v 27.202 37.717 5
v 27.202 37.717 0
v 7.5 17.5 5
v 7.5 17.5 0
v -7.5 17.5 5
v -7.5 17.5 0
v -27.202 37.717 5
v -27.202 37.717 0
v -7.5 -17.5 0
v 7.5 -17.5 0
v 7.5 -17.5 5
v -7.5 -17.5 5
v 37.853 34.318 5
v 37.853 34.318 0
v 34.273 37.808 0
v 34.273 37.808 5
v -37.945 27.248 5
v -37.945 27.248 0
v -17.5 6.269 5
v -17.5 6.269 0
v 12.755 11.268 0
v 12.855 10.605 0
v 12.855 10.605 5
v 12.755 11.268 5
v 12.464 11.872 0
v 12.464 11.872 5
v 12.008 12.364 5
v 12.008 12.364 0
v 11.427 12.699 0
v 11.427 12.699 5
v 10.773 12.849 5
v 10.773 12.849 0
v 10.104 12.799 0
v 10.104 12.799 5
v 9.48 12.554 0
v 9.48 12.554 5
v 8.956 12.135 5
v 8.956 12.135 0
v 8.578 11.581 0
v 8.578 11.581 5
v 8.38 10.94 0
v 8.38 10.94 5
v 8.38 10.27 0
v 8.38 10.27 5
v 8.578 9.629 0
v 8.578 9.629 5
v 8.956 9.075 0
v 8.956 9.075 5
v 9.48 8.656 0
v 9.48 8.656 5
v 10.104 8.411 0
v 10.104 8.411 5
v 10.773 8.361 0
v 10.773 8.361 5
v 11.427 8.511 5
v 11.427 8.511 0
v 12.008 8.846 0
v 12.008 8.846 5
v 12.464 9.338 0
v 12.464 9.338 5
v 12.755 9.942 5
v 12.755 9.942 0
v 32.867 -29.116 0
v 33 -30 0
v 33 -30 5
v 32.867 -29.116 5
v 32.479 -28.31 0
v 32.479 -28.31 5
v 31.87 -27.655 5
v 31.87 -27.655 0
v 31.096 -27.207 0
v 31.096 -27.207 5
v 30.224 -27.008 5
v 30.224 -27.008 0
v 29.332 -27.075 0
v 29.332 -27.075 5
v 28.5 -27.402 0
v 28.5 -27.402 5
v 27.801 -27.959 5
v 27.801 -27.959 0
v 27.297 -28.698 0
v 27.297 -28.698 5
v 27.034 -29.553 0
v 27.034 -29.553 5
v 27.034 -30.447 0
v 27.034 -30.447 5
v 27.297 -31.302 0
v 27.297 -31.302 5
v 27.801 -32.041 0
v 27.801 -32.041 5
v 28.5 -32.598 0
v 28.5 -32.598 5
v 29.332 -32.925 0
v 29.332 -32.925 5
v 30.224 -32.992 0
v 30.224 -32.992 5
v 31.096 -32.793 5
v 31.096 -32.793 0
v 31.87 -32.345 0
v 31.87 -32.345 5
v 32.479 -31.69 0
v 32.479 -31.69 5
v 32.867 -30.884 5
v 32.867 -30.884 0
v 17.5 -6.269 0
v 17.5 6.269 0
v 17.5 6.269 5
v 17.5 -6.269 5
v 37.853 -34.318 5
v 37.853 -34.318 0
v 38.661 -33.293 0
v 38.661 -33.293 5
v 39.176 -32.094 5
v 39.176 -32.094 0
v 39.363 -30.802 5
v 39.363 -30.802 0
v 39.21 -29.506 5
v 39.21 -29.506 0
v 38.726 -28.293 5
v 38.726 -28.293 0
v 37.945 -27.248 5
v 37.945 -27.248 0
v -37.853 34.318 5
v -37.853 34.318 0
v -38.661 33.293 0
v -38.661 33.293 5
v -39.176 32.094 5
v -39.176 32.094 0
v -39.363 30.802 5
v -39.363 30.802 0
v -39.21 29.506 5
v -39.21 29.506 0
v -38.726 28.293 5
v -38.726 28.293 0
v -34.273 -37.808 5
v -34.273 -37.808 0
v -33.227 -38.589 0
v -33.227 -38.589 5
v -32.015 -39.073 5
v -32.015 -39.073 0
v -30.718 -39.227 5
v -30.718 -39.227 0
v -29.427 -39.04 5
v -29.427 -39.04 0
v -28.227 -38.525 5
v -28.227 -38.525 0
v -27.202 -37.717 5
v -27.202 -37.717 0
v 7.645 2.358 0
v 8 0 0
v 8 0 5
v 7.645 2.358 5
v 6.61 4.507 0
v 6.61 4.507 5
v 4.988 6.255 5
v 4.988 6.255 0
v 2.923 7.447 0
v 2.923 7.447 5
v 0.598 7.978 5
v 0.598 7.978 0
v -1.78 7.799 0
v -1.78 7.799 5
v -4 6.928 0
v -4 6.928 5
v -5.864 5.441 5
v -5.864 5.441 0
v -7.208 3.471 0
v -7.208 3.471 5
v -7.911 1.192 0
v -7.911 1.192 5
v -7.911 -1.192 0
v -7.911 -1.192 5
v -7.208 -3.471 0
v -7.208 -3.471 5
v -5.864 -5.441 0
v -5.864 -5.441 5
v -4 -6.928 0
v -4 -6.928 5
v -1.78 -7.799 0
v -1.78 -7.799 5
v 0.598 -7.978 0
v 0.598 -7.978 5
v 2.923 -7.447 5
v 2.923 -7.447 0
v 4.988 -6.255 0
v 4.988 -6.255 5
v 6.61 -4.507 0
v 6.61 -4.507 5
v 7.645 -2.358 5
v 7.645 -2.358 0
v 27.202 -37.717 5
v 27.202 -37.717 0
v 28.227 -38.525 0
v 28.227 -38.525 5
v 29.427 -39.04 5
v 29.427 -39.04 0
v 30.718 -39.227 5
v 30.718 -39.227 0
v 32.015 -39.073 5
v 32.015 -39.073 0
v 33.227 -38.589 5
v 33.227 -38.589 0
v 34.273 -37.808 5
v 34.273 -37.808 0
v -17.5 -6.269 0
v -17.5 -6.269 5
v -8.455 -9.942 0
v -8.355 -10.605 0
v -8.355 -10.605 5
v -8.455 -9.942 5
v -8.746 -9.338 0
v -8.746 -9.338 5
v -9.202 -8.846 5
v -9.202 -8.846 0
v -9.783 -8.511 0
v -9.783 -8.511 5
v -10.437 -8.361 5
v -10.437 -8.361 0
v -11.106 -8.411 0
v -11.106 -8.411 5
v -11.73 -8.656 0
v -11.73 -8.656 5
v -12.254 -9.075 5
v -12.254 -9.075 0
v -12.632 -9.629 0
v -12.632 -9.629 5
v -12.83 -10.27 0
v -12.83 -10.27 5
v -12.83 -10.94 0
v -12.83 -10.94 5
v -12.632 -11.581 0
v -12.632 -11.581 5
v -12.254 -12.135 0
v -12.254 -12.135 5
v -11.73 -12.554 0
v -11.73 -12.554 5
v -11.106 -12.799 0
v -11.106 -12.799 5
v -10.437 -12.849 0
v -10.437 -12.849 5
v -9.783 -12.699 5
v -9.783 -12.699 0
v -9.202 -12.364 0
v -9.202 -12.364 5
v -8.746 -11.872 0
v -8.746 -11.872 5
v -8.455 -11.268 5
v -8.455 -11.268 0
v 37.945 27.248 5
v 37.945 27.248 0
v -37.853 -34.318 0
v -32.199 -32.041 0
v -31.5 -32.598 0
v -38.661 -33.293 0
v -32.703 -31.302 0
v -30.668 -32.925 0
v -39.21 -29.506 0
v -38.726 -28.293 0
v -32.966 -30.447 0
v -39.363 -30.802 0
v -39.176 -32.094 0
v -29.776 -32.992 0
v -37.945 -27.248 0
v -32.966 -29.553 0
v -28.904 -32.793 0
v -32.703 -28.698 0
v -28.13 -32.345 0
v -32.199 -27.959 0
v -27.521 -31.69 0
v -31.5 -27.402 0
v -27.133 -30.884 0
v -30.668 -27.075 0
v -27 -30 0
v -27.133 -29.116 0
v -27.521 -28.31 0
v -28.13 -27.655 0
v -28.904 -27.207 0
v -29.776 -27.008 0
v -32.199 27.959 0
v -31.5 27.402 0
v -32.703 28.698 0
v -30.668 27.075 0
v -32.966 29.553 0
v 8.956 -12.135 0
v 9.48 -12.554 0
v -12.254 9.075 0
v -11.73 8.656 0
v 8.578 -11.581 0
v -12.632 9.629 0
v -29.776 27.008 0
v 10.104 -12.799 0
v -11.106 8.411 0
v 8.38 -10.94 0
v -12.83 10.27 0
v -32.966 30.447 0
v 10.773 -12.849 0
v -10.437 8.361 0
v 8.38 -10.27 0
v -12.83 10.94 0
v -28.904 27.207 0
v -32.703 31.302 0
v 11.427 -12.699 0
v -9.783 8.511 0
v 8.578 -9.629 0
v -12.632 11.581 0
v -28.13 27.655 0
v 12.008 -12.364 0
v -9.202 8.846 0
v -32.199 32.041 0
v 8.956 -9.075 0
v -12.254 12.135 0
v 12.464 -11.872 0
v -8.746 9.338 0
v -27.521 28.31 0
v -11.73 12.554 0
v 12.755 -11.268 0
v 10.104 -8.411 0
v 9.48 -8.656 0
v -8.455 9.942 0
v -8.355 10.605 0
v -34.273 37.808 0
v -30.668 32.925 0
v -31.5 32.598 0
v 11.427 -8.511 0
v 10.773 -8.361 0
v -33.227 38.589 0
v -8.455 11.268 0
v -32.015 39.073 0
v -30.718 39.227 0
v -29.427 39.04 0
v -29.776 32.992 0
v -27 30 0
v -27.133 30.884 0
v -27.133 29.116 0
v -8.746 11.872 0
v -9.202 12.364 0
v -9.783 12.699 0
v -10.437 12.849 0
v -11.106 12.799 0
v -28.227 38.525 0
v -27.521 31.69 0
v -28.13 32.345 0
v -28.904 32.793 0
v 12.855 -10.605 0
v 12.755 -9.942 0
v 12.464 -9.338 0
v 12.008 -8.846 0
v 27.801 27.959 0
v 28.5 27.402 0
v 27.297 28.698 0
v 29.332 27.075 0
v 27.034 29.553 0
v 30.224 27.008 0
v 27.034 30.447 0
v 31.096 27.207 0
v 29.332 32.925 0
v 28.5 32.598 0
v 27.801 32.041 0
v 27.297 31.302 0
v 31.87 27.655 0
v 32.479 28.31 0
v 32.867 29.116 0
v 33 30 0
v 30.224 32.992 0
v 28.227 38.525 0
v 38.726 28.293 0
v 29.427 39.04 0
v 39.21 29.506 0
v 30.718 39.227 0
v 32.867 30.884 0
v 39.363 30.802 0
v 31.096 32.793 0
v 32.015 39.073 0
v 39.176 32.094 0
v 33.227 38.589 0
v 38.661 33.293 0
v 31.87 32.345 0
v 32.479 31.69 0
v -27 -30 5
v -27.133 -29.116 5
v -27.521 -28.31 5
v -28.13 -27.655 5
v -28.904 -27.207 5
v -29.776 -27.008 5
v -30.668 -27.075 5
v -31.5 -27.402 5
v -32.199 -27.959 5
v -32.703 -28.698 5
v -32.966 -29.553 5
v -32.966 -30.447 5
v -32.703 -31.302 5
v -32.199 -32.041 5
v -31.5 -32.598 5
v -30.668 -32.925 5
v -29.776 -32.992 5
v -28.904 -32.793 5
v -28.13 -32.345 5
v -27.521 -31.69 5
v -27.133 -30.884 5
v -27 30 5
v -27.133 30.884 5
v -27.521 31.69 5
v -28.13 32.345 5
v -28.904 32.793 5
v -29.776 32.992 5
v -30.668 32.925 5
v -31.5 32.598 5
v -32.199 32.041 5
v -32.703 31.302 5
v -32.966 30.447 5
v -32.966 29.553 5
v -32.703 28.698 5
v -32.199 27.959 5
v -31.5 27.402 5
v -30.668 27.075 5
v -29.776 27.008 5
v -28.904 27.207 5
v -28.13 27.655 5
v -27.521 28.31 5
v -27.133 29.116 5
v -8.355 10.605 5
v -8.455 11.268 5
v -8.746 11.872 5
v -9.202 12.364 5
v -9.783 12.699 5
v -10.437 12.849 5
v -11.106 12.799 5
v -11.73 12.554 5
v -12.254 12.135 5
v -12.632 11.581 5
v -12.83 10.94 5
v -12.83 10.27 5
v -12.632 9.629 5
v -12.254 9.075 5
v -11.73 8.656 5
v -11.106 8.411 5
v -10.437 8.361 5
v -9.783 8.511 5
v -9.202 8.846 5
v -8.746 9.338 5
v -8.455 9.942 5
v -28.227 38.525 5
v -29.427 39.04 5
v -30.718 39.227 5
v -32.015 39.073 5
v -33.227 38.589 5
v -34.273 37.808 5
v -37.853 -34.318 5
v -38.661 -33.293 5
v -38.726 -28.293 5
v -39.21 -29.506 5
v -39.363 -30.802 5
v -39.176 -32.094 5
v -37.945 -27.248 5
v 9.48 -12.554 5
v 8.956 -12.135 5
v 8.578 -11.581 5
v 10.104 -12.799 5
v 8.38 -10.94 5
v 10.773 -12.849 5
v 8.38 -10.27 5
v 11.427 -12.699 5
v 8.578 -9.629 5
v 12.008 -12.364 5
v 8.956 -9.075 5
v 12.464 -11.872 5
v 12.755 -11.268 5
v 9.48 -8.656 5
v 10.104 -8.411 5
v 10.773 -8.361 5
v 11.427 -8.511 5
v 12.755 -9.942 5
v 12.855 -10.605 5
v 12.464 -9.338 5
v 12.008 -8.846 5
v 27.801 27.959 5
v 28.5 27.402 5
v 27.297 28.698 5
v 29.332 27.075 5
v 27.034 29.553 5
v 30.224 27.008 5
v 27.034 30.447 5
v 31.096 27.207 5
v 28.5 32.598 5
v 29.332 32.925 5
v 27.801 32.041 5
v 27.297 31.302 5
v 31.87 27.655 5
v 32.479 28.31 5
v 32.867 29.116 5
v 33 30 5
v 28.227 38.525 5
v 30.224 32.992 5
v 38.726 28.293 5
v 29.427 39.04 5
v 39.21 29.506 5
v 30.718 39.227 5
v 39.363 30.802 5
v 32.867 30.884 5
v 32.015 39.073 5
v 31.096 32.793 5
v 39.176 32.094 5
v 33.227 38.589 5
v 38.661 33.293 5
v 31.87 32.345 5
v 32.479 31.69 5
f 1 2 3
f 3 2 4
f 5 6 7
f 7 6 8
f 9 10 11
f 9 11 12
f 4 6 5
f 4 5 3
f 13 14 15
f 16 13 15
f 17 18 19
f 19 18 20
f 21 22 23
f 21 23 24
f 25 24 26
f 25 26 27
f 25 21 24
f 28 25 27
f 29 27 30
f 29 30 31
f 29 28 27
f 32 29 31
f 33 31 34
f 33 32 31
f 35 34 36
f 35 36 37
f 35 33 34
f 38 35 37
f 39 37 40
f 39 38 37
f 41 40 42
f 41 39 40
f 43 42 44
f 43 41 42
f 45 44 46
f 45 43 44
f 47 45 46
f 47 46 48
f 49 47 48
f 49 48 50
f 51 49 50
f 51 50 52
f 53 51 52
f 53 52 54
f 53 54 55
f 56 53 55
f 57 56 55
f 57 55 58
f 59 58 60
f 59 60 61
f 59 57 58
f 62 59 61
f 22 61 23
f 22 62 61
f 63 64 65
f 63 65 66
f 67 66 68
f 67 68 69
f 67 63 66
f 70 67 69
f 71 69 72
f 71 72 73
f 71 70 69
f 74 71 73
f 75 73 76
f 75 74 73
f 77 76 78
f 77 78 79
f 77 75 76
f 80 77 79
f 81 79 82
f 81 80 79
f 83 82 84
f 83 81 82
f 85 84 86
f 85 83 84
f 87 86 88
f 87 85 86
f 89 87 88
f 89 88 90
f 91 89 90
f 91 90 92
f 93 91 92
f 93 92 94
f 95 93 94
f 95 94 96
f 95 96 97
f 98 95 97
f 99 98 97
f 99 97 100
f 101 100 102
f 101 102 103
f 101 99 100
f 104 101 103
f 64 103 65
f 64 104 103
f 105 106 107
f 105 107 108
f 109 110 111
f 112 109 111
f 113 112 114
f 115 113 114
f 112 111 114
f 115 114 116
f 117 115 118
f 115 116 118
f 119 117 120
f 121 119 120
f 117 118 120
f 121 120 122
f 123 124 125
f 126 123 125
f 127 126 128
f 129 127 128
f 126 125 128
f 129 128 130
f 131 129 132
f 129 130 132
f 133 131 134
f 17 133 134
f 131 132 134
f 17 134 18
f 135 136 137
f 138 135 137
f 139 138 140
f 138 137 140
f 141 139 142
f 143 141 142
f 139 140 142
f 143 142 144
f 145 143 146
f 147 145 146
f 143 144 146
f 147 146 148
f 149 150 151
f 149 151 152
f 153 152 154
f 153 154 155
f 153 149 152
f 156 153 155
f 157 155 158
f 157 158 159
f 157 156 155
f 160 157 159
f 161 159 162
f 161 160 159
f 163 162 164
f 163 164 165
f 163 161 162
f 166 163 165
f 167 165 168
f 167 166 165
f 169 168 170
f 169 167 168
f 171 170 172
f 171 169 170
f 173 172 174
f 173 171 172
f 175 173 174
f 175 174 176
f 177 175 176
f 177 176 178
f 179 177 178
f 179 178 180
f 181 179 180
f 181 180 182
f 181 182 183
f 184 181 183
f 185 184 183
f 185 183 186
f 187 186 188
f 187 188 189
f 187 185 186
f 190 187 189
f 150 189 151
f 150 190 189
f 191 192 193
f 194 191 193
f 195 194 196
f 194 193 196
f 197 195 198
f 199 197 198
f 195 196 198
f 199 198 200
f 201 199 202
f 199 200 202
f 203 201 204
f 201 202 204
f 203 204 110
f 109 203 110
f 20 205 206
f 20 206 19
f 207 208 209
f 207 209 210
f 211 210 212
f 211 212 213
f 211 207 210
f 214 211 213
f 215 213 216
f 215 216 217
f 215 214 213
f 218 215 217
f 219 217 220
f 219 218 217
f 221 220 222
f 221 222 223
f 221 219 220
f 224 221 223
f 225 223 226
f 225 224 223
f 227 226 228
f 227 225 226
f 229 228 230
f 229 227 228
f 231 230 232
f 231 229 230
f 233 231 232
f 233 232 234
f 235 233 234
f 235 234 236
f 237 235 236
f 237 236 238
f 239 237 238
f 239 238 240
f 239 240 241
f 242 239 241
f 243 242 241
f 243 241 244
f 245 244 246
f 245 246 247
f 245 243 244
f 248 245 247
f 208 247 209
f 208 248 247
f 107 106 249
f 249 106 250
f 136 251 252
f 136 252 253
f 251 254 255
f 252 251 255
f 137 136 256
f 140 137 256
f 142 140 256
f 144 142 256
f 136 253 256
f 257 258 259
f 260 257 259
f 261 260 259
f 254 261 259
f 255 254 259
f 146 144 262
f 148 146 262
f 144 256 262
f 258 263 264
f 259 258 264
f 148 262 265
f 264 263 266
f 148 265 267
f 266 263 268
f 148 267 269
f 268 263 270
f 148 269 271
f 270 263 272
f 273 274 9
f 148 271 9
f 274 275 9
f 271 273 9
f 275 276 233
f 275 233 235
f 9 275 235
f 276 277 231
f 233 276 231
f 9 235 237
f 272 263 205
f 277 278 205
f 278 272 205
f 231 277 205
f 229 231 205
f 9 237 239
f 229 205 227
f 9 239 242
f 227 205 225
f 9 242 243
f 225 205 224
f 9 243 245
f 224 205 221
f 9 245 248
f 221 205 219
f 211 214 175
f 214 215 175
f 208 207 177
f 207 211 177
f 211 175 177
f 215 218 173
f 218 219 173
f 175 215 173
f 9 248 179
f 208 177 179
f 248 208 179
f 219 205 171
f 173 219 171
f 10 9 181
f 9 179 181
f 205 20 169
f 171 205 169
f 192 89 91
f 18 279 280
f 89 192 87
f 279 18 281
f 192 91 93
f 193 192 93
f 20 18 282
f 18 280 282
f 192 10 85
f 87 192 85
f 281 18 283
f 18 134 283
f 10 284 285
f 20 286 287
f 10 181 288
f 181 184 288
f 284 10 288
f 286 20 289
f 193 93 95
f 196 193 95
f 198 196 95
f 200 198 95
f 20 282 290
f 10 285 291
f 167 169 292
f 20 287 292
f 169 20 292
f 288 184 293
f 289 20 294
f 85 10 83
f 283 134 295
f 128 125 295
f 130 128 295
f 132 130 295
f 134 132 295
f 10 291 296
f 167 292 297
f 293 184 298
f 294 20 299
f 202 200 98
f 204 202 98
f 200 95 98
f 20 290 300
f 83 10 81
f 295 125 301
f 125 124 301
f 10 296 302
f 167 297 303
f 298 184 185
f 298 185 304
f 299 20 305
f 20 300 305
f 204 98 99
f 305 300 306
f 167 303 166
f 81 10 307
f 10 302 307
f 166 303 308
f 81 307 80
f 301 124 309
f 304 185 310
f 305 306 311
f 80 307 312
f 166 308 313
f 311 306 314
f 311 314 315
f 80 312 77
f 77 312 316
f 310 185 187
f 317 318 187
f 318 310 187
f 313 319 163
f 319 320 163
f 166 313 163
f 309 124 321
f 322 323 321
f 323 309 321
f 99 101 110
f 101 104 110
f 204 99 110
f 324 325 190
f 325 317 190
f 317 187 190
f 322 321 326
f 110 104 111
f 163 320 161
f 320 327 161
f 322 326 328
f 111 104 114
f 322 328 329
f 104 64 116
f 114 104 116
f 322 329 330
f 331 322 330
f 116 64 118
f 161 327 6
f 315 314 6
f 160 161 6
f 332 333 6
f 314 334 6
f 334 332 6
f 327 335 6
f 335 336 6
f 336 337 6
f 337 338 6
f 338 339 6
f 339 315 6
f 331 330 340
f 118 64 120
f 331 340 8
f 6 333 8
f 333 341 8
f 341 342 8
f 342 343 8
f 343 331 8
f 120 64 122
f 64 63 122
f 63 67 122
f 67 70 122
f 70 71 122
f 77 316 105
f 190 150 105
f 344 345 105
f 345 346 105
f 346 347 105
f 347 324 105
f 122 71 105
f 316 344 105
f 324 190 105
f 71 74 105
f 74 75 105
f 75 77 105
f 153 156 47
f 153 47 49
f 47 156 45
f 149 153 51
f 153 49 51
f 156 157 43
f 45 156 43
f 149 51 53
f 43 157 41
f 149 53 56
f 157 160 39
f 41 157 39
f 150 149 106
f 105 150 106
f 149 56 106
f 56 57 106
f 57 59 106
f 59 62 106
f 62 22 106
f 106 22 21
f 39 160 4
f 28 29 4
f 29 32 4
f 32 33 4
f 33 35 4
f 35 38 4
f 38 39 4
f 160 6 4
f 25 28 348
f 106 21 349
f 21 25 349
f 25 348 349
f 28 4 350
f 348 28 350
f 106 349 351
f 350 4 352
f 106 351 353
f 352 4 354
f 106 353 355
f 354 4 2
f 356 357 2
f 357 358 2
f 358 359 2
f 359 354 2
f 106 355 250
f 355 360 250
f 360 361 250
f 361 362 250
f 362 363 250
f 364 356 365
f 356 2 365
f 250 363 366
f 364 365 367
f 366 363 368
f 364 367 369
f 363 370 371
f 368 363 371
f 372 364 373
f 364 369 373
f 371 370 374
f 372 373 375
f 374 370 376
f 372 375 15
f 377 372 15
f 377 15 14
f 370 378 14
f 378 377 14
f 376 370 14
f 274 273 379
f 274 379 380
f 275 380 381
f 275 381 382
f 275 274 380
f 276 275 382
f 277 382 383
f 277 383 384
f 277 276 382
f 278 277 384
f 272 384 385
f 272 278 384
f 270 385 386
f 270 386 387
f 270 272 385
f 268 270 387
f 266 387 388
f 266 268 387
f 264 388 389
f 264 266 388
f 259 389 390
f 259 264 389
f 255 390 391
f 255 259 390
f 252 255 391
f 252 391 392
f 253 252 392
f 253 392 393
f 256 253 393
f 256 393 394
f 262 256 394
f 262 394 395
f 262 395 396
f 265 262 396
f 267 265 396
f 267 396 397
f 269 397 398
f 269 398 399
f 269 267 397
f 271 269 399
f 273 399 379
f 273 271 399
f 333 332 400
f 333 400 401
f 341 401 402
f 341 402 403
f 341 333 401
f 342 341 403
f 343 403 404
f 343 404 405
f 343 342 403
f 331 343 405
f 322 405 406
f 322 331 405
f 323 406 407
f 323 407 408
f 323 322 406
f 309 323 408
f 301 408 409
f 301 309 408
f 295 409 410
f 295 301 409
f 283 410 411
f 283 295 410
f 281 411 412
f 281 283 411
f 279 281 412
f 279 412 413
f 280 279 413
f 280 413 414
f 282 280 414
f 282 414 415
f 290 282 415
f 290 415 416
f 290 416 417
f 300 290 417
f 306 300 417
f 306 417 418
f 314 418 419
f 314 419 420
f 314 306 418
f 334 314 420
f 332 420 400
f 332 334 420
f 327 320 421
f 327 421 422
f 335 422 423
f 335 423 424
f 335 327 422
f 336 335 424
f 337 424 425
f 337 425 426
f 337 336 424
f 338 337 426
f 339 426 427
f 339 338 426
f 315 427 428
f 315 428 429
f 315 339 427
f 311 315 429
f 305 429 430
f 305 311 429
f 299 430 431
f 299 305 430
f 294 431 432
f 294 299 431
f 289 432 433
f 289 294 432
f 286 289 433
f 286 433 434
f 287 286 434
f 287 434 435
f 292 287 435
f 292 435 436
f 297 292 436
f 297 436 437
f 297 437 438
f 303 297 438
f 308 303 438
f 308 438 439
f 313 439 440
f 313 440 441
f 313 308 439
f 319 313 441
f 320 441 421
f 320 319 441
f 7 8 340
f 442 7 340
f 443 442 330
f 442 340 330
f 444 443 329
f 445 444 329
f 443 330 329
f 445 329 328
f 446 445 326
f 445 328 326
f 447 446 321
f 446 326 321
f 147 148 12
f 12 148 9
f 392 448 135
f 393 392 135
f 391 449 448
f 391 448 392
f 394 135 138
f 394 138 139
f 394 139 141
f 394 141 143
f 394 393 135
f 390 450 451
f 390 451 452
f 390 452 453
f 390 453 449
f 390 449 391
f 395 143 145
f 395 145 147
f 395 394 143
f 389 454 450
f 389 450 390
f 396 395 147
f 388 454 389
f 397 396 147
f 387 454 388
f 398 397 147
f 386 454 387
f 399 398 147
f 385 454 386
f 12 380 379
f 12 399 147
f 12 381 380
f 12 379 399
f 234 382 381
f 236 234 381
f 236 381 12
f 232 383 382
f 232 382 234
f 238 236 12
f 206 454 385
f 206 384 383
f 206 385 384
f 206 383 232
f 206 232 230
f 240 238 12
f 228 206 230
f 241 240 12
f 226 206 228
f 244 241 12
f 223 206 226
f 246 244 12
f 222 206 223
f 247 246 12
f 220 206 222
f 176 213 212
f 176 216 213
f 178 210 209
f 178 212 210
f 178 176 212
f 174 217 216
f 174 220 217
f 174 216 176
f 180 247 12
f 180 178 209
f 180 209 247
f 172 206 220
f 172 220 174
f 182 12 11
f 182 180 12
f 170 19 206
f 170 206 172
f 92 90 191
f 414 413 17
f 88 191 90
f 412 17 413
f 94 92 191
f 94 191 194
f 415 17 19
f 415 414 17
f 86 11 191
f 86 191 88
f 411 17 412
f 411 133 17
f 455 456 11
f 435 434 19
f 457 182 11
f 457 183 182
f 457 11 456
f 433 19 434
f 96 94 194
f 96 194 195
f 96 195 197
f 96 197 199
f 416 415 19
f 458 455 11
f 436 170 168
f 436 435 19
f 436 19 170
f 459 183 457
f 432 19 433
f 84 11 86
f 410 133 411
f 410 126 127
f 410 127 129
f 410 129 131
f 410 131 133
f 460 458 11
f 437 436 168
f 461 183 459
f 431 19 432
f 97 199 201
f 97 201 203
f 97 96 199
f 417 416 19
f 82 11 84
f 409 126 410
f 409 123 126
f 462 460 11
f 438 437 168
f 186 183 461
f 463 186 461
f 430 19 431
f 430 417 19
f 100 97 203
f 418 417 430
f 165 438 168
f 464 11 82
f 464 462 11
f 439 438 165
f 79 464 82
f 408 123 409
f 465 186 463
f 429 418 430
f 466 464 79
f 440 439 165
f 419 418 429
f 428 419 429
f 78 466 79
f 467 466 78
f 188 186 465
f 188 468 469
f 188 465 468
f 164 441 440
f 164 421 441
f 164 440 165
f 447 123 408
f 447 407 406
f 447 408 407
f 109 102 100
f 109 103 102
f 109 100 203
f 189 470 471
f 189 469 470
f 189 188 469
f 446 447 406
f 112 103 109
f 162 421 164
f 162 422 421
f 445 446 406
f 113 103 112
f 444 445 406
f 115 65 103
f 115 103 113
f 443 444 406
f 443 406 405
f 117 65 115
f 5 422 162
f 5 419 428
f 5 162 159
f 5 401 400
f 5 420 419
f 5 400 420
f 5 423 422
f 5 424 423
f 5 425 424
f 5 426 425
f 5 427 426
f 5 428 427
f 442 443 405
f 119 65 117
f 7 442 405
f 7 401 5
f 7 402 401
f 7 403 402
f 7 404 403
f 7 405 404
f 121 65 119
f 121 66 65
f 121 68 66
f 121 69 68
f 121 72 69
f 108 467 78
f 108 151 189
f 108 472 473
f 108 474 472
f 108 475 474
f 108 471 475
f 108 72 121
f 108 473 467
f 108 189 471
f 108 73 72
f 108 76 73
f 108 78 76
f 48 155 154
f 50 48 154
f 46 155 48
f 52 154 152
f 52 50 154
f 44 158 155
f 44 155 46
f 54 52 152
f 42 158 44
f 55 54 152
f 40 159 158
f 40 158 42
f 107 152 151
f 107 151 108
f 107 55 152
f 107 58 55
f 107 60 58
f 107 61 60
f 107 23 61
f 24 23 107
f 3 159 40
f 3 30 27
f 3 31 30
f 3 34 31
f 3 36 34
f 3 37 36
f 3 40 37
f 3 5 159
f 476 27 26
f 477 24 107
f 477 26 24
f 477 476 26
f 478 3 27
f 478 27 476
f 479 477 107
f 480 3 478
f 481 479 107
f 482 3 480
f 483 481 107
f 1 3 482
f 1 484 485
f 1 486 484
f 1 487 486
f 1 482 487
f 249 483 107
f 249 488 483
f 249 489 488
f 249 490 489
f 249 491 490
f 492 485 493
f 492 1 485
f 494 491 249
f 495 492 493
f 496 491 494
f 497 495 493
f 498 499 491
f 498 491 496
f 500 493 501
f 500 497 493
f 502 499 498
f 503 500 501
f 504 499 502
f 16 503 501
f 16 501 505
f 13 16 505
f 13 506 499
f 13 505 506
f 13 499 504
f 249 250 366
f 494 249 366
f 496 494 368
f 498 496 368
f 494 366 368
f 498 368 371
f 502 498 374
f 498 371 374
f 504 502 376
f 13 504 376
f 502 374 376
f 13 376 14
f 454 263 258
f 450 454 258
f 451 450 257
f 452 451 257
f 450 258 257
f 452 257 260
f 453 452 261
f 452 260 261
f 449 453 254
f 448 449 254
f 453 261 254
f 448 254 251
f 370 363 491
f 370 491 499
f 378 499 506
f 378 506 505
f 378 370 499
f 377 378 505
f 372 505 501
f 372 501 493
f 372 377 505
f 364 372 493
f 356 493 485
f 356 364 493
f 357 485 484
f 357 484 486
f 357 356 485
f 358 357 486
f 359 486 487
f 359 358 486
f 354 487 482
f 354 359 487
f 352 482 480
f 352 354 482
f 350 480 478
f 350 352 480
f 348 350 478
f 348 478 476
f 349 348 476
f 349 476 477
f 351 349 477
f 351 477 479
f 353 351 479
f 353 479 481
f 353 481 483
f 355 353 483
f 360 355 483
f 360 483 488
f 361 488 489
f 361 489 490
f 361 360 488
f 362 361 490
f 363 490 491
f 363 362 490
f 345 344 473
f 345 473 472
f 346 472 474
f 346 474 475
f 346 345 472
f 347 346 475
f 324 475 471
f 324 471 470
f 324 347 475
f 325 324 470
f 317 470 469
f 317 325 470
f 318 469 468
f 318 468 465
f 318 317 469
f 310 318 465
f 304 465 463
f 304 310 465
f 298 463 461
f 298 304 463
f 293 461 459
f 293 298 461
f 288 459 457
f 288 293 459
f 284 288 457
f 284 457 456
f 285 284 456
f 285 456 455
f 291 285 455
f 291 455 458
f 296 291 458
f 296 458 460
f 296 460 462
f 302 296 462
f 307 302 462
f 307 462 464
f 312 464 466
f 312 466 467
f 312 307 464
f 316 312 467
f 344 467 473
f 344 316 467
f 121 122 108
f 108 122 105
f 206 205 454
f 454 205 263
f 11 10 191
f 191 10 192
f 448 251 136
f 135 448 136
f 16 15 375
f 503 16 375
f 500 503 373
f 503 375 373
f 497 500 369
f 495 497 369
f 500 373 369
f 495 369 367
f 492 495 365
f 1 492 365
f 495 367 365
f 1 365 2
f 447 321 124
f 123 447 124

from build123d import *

# Parameters (mm, degrees)
ESQUISSE1_R        = 8
ESQUISSE1_R_2      = 2.25
BOSS_EXTRU_1_DEPTH = 5
BOSS_EXTRU_2_START = -5
ESQUISSE2_R        = 3
BOSS_EXTRU_2_DEPTH = 5


with BuildPart() as part:
    # Esquisse1 → Boss.-Extru.1 (new body)
    with BuildSketch(Plane.XY):
        with BuildLine():
            Line((7.5, -17.5), (-7.5, -17.5))
            ThreePointArc((-7.5, -17.5), (-14.571067812, -14.571067812), (-17.5, -7.5))
            Line((-17.5, -7.5), (-17.5, 7.5))
            ThreePointArc((-17.5, 7.5), (-14.571067812, 14.571067812), (-7.5, 17.5))
            Line((-7.5, 17.5), (7.5, 17.5))
            ThreePointArc((7.5, 17.5), (14.571067812, 14.571067812), (17.5, 7.5))
            Line((17.5, 7.5), (17.5, -7.5))
            ThreePointArc((17.5, -7.5), (14.571067812, -14.571067812), (7.5, -17.5))
        make_face()
        Circle(ESQUISSE1_R, mode=Mode.SUBTRACT)
        with Locations((-10.605, 10.605)):
            Circle(ESQUISSE1_R_2, mode=Mode.SUBTRACT)
        with Locations((10.605, 10.605)):
            Circle(ESQUISSE1_R_2, mode=Mode.SUBTRACT)
        with Locations((-10.605, -10.605)):
            Circle(ESQUISSE1_R_2, mode=Mode.SUBTRACT)
        with Locations((10.605, -10.605)):
            Circle(ESQUISSE1_R_2, mode=Mode.SUBTRACT)
    extrude(amount=BOSS_EXTRU_1_DEPTH)

    # Esquisse2 → Boss.-Extru.2 (add)
    # profile 1 of 4: a face of its own
    with BuildSketch(Plane.XY.offset(5).offset(BOSS_EXTRU_2_START)):
        with BuildLine():
            Line((-37.944507823, 27.247644267), (-17.5, 6.269167951))
            Line((-17.5, 6.269167951), (-17.5, 7.5))
            ThreePointArc((-17.5, 7.5), (-14.571067812, 14.571067812), (-7.5, 17.5))
            Line((-7.5, 17.5), (-27.202072783, 37.7166504))
            ThreePointArc((-27.202072783, 37.7166504), (-30.718436651, 39.22656632), (-34.272553174, 37.807793369))
            Line((-34.272553174, 37.807793369), (-37.853364854, 34.318124658))
            ThreePointArc((-37.853364854, 34.318124658), (-39.363280773, 30.80176079), (-37.944507823, 27.247644267))
        make_face()
        with Locations((-30, 30)):
            Circle(ESQUISSE2_R, mode=Mode.SUBTRACT)
    # profile 2 of 4: a face of its own
    with BuildSketch(Plane.XY.offset(5).offset(BOSS_EXTRU_2_START)):
        with BuildLine():
            ThreePointArc((37.944507823, 27.247644267), (39.363280773, 30.80176079), (37.853364854, 34.318124658))
            Line((37.853364854, 34.318124658), (34.272553174, 37.807793369))
            ThreePointArc((34.272553174, 37.807793369), (30.718436651, 39.22656632), (27.202072783, 37.7166504))
            Line((27.202072783, 37.7166504), (7.5, 17.5))
            ThreePointArc((7.5, 17.5), (14.571067812, 14.571067812), (17.5, 7.5))
            Line((17.5, 7.5), (17.5, 6.269167951))
            Line((17.5, 6.269167951), (37.944507823, 27.247644267))
        make_face()
        with Locations((30, 30)):
            Circle(ESQUISSE2_R, mode=Mode.SUBTRACT)
    # profile 3 of 4: a face of its own
    with BuildSketch(Plane.XY.offset(5).offset(BOSS_EXTRU_2_START)):
        with BuildLine():
            Line((37.944507823, -27.247644267), (17.5, -6.269167951))
            Line((17.5, -6.269167951), (17.5, -7.5))
            ThreePointArc((17.5, -7.5), (14.571067812, -14.571067812), (7.5, -17.5))
            Line((7.5, -17.5), (27.202072783, -37.7166504))
            ThreePointArc((27.202072783, -37.7166504), (30.718436651, -39.22656632), (34.272553174, -37.807793369))
            Line((34.272553174, -37.807793369), (37.853364854, -34.318124658))
            ThreePointArc((37.853364854, -34.318124658), (39.363280773, -30.80176079), (37.944507823, -27.247644267))
        make_face()
        with Locations((30, -30)):
            Circle(ESQUISSE2_R, mode=Mode.SUBTRACT)
    # profile 4 of 4: a face of its own
    with BuildSketch(Plane.XY.offset(5).offset(BOSS_EXTRU_2_START)):
        with BuildLine():
            Line((-17.5, -7.5), (-17.5, -6.269167951))
            Line((-17.5, -6.269167951), (-37.944507823, -27.247644267))
            ThreePointArc((-37.944507823, -27.247644267), (-39.363280773, -30.80176079), (-37.853364854, -34.318124658))
            Line((-37.853364854, -34.318124658), (-34.272553174, -37.807793369))
            ThreePointArc((-34.272553174, -37.807793369), (-30.718436651, -39.22656632), (-27.202072783, -37.7166504))
            Line((-27.202072783, -37.7166504), (-7.5, -17.5))
            ThreePointArc((-7.5, -17.5), (-14.571067812, -14.571067812), (-17.5, -7.5))
        make_face()
        with Locations((-30, -30)):
            Circle(ESQUISSE2_R, mode=Mode.SUBTRACT)
    extrude(amount=BOSS_EXTRU_2_DEPTH)


solid = part.part
